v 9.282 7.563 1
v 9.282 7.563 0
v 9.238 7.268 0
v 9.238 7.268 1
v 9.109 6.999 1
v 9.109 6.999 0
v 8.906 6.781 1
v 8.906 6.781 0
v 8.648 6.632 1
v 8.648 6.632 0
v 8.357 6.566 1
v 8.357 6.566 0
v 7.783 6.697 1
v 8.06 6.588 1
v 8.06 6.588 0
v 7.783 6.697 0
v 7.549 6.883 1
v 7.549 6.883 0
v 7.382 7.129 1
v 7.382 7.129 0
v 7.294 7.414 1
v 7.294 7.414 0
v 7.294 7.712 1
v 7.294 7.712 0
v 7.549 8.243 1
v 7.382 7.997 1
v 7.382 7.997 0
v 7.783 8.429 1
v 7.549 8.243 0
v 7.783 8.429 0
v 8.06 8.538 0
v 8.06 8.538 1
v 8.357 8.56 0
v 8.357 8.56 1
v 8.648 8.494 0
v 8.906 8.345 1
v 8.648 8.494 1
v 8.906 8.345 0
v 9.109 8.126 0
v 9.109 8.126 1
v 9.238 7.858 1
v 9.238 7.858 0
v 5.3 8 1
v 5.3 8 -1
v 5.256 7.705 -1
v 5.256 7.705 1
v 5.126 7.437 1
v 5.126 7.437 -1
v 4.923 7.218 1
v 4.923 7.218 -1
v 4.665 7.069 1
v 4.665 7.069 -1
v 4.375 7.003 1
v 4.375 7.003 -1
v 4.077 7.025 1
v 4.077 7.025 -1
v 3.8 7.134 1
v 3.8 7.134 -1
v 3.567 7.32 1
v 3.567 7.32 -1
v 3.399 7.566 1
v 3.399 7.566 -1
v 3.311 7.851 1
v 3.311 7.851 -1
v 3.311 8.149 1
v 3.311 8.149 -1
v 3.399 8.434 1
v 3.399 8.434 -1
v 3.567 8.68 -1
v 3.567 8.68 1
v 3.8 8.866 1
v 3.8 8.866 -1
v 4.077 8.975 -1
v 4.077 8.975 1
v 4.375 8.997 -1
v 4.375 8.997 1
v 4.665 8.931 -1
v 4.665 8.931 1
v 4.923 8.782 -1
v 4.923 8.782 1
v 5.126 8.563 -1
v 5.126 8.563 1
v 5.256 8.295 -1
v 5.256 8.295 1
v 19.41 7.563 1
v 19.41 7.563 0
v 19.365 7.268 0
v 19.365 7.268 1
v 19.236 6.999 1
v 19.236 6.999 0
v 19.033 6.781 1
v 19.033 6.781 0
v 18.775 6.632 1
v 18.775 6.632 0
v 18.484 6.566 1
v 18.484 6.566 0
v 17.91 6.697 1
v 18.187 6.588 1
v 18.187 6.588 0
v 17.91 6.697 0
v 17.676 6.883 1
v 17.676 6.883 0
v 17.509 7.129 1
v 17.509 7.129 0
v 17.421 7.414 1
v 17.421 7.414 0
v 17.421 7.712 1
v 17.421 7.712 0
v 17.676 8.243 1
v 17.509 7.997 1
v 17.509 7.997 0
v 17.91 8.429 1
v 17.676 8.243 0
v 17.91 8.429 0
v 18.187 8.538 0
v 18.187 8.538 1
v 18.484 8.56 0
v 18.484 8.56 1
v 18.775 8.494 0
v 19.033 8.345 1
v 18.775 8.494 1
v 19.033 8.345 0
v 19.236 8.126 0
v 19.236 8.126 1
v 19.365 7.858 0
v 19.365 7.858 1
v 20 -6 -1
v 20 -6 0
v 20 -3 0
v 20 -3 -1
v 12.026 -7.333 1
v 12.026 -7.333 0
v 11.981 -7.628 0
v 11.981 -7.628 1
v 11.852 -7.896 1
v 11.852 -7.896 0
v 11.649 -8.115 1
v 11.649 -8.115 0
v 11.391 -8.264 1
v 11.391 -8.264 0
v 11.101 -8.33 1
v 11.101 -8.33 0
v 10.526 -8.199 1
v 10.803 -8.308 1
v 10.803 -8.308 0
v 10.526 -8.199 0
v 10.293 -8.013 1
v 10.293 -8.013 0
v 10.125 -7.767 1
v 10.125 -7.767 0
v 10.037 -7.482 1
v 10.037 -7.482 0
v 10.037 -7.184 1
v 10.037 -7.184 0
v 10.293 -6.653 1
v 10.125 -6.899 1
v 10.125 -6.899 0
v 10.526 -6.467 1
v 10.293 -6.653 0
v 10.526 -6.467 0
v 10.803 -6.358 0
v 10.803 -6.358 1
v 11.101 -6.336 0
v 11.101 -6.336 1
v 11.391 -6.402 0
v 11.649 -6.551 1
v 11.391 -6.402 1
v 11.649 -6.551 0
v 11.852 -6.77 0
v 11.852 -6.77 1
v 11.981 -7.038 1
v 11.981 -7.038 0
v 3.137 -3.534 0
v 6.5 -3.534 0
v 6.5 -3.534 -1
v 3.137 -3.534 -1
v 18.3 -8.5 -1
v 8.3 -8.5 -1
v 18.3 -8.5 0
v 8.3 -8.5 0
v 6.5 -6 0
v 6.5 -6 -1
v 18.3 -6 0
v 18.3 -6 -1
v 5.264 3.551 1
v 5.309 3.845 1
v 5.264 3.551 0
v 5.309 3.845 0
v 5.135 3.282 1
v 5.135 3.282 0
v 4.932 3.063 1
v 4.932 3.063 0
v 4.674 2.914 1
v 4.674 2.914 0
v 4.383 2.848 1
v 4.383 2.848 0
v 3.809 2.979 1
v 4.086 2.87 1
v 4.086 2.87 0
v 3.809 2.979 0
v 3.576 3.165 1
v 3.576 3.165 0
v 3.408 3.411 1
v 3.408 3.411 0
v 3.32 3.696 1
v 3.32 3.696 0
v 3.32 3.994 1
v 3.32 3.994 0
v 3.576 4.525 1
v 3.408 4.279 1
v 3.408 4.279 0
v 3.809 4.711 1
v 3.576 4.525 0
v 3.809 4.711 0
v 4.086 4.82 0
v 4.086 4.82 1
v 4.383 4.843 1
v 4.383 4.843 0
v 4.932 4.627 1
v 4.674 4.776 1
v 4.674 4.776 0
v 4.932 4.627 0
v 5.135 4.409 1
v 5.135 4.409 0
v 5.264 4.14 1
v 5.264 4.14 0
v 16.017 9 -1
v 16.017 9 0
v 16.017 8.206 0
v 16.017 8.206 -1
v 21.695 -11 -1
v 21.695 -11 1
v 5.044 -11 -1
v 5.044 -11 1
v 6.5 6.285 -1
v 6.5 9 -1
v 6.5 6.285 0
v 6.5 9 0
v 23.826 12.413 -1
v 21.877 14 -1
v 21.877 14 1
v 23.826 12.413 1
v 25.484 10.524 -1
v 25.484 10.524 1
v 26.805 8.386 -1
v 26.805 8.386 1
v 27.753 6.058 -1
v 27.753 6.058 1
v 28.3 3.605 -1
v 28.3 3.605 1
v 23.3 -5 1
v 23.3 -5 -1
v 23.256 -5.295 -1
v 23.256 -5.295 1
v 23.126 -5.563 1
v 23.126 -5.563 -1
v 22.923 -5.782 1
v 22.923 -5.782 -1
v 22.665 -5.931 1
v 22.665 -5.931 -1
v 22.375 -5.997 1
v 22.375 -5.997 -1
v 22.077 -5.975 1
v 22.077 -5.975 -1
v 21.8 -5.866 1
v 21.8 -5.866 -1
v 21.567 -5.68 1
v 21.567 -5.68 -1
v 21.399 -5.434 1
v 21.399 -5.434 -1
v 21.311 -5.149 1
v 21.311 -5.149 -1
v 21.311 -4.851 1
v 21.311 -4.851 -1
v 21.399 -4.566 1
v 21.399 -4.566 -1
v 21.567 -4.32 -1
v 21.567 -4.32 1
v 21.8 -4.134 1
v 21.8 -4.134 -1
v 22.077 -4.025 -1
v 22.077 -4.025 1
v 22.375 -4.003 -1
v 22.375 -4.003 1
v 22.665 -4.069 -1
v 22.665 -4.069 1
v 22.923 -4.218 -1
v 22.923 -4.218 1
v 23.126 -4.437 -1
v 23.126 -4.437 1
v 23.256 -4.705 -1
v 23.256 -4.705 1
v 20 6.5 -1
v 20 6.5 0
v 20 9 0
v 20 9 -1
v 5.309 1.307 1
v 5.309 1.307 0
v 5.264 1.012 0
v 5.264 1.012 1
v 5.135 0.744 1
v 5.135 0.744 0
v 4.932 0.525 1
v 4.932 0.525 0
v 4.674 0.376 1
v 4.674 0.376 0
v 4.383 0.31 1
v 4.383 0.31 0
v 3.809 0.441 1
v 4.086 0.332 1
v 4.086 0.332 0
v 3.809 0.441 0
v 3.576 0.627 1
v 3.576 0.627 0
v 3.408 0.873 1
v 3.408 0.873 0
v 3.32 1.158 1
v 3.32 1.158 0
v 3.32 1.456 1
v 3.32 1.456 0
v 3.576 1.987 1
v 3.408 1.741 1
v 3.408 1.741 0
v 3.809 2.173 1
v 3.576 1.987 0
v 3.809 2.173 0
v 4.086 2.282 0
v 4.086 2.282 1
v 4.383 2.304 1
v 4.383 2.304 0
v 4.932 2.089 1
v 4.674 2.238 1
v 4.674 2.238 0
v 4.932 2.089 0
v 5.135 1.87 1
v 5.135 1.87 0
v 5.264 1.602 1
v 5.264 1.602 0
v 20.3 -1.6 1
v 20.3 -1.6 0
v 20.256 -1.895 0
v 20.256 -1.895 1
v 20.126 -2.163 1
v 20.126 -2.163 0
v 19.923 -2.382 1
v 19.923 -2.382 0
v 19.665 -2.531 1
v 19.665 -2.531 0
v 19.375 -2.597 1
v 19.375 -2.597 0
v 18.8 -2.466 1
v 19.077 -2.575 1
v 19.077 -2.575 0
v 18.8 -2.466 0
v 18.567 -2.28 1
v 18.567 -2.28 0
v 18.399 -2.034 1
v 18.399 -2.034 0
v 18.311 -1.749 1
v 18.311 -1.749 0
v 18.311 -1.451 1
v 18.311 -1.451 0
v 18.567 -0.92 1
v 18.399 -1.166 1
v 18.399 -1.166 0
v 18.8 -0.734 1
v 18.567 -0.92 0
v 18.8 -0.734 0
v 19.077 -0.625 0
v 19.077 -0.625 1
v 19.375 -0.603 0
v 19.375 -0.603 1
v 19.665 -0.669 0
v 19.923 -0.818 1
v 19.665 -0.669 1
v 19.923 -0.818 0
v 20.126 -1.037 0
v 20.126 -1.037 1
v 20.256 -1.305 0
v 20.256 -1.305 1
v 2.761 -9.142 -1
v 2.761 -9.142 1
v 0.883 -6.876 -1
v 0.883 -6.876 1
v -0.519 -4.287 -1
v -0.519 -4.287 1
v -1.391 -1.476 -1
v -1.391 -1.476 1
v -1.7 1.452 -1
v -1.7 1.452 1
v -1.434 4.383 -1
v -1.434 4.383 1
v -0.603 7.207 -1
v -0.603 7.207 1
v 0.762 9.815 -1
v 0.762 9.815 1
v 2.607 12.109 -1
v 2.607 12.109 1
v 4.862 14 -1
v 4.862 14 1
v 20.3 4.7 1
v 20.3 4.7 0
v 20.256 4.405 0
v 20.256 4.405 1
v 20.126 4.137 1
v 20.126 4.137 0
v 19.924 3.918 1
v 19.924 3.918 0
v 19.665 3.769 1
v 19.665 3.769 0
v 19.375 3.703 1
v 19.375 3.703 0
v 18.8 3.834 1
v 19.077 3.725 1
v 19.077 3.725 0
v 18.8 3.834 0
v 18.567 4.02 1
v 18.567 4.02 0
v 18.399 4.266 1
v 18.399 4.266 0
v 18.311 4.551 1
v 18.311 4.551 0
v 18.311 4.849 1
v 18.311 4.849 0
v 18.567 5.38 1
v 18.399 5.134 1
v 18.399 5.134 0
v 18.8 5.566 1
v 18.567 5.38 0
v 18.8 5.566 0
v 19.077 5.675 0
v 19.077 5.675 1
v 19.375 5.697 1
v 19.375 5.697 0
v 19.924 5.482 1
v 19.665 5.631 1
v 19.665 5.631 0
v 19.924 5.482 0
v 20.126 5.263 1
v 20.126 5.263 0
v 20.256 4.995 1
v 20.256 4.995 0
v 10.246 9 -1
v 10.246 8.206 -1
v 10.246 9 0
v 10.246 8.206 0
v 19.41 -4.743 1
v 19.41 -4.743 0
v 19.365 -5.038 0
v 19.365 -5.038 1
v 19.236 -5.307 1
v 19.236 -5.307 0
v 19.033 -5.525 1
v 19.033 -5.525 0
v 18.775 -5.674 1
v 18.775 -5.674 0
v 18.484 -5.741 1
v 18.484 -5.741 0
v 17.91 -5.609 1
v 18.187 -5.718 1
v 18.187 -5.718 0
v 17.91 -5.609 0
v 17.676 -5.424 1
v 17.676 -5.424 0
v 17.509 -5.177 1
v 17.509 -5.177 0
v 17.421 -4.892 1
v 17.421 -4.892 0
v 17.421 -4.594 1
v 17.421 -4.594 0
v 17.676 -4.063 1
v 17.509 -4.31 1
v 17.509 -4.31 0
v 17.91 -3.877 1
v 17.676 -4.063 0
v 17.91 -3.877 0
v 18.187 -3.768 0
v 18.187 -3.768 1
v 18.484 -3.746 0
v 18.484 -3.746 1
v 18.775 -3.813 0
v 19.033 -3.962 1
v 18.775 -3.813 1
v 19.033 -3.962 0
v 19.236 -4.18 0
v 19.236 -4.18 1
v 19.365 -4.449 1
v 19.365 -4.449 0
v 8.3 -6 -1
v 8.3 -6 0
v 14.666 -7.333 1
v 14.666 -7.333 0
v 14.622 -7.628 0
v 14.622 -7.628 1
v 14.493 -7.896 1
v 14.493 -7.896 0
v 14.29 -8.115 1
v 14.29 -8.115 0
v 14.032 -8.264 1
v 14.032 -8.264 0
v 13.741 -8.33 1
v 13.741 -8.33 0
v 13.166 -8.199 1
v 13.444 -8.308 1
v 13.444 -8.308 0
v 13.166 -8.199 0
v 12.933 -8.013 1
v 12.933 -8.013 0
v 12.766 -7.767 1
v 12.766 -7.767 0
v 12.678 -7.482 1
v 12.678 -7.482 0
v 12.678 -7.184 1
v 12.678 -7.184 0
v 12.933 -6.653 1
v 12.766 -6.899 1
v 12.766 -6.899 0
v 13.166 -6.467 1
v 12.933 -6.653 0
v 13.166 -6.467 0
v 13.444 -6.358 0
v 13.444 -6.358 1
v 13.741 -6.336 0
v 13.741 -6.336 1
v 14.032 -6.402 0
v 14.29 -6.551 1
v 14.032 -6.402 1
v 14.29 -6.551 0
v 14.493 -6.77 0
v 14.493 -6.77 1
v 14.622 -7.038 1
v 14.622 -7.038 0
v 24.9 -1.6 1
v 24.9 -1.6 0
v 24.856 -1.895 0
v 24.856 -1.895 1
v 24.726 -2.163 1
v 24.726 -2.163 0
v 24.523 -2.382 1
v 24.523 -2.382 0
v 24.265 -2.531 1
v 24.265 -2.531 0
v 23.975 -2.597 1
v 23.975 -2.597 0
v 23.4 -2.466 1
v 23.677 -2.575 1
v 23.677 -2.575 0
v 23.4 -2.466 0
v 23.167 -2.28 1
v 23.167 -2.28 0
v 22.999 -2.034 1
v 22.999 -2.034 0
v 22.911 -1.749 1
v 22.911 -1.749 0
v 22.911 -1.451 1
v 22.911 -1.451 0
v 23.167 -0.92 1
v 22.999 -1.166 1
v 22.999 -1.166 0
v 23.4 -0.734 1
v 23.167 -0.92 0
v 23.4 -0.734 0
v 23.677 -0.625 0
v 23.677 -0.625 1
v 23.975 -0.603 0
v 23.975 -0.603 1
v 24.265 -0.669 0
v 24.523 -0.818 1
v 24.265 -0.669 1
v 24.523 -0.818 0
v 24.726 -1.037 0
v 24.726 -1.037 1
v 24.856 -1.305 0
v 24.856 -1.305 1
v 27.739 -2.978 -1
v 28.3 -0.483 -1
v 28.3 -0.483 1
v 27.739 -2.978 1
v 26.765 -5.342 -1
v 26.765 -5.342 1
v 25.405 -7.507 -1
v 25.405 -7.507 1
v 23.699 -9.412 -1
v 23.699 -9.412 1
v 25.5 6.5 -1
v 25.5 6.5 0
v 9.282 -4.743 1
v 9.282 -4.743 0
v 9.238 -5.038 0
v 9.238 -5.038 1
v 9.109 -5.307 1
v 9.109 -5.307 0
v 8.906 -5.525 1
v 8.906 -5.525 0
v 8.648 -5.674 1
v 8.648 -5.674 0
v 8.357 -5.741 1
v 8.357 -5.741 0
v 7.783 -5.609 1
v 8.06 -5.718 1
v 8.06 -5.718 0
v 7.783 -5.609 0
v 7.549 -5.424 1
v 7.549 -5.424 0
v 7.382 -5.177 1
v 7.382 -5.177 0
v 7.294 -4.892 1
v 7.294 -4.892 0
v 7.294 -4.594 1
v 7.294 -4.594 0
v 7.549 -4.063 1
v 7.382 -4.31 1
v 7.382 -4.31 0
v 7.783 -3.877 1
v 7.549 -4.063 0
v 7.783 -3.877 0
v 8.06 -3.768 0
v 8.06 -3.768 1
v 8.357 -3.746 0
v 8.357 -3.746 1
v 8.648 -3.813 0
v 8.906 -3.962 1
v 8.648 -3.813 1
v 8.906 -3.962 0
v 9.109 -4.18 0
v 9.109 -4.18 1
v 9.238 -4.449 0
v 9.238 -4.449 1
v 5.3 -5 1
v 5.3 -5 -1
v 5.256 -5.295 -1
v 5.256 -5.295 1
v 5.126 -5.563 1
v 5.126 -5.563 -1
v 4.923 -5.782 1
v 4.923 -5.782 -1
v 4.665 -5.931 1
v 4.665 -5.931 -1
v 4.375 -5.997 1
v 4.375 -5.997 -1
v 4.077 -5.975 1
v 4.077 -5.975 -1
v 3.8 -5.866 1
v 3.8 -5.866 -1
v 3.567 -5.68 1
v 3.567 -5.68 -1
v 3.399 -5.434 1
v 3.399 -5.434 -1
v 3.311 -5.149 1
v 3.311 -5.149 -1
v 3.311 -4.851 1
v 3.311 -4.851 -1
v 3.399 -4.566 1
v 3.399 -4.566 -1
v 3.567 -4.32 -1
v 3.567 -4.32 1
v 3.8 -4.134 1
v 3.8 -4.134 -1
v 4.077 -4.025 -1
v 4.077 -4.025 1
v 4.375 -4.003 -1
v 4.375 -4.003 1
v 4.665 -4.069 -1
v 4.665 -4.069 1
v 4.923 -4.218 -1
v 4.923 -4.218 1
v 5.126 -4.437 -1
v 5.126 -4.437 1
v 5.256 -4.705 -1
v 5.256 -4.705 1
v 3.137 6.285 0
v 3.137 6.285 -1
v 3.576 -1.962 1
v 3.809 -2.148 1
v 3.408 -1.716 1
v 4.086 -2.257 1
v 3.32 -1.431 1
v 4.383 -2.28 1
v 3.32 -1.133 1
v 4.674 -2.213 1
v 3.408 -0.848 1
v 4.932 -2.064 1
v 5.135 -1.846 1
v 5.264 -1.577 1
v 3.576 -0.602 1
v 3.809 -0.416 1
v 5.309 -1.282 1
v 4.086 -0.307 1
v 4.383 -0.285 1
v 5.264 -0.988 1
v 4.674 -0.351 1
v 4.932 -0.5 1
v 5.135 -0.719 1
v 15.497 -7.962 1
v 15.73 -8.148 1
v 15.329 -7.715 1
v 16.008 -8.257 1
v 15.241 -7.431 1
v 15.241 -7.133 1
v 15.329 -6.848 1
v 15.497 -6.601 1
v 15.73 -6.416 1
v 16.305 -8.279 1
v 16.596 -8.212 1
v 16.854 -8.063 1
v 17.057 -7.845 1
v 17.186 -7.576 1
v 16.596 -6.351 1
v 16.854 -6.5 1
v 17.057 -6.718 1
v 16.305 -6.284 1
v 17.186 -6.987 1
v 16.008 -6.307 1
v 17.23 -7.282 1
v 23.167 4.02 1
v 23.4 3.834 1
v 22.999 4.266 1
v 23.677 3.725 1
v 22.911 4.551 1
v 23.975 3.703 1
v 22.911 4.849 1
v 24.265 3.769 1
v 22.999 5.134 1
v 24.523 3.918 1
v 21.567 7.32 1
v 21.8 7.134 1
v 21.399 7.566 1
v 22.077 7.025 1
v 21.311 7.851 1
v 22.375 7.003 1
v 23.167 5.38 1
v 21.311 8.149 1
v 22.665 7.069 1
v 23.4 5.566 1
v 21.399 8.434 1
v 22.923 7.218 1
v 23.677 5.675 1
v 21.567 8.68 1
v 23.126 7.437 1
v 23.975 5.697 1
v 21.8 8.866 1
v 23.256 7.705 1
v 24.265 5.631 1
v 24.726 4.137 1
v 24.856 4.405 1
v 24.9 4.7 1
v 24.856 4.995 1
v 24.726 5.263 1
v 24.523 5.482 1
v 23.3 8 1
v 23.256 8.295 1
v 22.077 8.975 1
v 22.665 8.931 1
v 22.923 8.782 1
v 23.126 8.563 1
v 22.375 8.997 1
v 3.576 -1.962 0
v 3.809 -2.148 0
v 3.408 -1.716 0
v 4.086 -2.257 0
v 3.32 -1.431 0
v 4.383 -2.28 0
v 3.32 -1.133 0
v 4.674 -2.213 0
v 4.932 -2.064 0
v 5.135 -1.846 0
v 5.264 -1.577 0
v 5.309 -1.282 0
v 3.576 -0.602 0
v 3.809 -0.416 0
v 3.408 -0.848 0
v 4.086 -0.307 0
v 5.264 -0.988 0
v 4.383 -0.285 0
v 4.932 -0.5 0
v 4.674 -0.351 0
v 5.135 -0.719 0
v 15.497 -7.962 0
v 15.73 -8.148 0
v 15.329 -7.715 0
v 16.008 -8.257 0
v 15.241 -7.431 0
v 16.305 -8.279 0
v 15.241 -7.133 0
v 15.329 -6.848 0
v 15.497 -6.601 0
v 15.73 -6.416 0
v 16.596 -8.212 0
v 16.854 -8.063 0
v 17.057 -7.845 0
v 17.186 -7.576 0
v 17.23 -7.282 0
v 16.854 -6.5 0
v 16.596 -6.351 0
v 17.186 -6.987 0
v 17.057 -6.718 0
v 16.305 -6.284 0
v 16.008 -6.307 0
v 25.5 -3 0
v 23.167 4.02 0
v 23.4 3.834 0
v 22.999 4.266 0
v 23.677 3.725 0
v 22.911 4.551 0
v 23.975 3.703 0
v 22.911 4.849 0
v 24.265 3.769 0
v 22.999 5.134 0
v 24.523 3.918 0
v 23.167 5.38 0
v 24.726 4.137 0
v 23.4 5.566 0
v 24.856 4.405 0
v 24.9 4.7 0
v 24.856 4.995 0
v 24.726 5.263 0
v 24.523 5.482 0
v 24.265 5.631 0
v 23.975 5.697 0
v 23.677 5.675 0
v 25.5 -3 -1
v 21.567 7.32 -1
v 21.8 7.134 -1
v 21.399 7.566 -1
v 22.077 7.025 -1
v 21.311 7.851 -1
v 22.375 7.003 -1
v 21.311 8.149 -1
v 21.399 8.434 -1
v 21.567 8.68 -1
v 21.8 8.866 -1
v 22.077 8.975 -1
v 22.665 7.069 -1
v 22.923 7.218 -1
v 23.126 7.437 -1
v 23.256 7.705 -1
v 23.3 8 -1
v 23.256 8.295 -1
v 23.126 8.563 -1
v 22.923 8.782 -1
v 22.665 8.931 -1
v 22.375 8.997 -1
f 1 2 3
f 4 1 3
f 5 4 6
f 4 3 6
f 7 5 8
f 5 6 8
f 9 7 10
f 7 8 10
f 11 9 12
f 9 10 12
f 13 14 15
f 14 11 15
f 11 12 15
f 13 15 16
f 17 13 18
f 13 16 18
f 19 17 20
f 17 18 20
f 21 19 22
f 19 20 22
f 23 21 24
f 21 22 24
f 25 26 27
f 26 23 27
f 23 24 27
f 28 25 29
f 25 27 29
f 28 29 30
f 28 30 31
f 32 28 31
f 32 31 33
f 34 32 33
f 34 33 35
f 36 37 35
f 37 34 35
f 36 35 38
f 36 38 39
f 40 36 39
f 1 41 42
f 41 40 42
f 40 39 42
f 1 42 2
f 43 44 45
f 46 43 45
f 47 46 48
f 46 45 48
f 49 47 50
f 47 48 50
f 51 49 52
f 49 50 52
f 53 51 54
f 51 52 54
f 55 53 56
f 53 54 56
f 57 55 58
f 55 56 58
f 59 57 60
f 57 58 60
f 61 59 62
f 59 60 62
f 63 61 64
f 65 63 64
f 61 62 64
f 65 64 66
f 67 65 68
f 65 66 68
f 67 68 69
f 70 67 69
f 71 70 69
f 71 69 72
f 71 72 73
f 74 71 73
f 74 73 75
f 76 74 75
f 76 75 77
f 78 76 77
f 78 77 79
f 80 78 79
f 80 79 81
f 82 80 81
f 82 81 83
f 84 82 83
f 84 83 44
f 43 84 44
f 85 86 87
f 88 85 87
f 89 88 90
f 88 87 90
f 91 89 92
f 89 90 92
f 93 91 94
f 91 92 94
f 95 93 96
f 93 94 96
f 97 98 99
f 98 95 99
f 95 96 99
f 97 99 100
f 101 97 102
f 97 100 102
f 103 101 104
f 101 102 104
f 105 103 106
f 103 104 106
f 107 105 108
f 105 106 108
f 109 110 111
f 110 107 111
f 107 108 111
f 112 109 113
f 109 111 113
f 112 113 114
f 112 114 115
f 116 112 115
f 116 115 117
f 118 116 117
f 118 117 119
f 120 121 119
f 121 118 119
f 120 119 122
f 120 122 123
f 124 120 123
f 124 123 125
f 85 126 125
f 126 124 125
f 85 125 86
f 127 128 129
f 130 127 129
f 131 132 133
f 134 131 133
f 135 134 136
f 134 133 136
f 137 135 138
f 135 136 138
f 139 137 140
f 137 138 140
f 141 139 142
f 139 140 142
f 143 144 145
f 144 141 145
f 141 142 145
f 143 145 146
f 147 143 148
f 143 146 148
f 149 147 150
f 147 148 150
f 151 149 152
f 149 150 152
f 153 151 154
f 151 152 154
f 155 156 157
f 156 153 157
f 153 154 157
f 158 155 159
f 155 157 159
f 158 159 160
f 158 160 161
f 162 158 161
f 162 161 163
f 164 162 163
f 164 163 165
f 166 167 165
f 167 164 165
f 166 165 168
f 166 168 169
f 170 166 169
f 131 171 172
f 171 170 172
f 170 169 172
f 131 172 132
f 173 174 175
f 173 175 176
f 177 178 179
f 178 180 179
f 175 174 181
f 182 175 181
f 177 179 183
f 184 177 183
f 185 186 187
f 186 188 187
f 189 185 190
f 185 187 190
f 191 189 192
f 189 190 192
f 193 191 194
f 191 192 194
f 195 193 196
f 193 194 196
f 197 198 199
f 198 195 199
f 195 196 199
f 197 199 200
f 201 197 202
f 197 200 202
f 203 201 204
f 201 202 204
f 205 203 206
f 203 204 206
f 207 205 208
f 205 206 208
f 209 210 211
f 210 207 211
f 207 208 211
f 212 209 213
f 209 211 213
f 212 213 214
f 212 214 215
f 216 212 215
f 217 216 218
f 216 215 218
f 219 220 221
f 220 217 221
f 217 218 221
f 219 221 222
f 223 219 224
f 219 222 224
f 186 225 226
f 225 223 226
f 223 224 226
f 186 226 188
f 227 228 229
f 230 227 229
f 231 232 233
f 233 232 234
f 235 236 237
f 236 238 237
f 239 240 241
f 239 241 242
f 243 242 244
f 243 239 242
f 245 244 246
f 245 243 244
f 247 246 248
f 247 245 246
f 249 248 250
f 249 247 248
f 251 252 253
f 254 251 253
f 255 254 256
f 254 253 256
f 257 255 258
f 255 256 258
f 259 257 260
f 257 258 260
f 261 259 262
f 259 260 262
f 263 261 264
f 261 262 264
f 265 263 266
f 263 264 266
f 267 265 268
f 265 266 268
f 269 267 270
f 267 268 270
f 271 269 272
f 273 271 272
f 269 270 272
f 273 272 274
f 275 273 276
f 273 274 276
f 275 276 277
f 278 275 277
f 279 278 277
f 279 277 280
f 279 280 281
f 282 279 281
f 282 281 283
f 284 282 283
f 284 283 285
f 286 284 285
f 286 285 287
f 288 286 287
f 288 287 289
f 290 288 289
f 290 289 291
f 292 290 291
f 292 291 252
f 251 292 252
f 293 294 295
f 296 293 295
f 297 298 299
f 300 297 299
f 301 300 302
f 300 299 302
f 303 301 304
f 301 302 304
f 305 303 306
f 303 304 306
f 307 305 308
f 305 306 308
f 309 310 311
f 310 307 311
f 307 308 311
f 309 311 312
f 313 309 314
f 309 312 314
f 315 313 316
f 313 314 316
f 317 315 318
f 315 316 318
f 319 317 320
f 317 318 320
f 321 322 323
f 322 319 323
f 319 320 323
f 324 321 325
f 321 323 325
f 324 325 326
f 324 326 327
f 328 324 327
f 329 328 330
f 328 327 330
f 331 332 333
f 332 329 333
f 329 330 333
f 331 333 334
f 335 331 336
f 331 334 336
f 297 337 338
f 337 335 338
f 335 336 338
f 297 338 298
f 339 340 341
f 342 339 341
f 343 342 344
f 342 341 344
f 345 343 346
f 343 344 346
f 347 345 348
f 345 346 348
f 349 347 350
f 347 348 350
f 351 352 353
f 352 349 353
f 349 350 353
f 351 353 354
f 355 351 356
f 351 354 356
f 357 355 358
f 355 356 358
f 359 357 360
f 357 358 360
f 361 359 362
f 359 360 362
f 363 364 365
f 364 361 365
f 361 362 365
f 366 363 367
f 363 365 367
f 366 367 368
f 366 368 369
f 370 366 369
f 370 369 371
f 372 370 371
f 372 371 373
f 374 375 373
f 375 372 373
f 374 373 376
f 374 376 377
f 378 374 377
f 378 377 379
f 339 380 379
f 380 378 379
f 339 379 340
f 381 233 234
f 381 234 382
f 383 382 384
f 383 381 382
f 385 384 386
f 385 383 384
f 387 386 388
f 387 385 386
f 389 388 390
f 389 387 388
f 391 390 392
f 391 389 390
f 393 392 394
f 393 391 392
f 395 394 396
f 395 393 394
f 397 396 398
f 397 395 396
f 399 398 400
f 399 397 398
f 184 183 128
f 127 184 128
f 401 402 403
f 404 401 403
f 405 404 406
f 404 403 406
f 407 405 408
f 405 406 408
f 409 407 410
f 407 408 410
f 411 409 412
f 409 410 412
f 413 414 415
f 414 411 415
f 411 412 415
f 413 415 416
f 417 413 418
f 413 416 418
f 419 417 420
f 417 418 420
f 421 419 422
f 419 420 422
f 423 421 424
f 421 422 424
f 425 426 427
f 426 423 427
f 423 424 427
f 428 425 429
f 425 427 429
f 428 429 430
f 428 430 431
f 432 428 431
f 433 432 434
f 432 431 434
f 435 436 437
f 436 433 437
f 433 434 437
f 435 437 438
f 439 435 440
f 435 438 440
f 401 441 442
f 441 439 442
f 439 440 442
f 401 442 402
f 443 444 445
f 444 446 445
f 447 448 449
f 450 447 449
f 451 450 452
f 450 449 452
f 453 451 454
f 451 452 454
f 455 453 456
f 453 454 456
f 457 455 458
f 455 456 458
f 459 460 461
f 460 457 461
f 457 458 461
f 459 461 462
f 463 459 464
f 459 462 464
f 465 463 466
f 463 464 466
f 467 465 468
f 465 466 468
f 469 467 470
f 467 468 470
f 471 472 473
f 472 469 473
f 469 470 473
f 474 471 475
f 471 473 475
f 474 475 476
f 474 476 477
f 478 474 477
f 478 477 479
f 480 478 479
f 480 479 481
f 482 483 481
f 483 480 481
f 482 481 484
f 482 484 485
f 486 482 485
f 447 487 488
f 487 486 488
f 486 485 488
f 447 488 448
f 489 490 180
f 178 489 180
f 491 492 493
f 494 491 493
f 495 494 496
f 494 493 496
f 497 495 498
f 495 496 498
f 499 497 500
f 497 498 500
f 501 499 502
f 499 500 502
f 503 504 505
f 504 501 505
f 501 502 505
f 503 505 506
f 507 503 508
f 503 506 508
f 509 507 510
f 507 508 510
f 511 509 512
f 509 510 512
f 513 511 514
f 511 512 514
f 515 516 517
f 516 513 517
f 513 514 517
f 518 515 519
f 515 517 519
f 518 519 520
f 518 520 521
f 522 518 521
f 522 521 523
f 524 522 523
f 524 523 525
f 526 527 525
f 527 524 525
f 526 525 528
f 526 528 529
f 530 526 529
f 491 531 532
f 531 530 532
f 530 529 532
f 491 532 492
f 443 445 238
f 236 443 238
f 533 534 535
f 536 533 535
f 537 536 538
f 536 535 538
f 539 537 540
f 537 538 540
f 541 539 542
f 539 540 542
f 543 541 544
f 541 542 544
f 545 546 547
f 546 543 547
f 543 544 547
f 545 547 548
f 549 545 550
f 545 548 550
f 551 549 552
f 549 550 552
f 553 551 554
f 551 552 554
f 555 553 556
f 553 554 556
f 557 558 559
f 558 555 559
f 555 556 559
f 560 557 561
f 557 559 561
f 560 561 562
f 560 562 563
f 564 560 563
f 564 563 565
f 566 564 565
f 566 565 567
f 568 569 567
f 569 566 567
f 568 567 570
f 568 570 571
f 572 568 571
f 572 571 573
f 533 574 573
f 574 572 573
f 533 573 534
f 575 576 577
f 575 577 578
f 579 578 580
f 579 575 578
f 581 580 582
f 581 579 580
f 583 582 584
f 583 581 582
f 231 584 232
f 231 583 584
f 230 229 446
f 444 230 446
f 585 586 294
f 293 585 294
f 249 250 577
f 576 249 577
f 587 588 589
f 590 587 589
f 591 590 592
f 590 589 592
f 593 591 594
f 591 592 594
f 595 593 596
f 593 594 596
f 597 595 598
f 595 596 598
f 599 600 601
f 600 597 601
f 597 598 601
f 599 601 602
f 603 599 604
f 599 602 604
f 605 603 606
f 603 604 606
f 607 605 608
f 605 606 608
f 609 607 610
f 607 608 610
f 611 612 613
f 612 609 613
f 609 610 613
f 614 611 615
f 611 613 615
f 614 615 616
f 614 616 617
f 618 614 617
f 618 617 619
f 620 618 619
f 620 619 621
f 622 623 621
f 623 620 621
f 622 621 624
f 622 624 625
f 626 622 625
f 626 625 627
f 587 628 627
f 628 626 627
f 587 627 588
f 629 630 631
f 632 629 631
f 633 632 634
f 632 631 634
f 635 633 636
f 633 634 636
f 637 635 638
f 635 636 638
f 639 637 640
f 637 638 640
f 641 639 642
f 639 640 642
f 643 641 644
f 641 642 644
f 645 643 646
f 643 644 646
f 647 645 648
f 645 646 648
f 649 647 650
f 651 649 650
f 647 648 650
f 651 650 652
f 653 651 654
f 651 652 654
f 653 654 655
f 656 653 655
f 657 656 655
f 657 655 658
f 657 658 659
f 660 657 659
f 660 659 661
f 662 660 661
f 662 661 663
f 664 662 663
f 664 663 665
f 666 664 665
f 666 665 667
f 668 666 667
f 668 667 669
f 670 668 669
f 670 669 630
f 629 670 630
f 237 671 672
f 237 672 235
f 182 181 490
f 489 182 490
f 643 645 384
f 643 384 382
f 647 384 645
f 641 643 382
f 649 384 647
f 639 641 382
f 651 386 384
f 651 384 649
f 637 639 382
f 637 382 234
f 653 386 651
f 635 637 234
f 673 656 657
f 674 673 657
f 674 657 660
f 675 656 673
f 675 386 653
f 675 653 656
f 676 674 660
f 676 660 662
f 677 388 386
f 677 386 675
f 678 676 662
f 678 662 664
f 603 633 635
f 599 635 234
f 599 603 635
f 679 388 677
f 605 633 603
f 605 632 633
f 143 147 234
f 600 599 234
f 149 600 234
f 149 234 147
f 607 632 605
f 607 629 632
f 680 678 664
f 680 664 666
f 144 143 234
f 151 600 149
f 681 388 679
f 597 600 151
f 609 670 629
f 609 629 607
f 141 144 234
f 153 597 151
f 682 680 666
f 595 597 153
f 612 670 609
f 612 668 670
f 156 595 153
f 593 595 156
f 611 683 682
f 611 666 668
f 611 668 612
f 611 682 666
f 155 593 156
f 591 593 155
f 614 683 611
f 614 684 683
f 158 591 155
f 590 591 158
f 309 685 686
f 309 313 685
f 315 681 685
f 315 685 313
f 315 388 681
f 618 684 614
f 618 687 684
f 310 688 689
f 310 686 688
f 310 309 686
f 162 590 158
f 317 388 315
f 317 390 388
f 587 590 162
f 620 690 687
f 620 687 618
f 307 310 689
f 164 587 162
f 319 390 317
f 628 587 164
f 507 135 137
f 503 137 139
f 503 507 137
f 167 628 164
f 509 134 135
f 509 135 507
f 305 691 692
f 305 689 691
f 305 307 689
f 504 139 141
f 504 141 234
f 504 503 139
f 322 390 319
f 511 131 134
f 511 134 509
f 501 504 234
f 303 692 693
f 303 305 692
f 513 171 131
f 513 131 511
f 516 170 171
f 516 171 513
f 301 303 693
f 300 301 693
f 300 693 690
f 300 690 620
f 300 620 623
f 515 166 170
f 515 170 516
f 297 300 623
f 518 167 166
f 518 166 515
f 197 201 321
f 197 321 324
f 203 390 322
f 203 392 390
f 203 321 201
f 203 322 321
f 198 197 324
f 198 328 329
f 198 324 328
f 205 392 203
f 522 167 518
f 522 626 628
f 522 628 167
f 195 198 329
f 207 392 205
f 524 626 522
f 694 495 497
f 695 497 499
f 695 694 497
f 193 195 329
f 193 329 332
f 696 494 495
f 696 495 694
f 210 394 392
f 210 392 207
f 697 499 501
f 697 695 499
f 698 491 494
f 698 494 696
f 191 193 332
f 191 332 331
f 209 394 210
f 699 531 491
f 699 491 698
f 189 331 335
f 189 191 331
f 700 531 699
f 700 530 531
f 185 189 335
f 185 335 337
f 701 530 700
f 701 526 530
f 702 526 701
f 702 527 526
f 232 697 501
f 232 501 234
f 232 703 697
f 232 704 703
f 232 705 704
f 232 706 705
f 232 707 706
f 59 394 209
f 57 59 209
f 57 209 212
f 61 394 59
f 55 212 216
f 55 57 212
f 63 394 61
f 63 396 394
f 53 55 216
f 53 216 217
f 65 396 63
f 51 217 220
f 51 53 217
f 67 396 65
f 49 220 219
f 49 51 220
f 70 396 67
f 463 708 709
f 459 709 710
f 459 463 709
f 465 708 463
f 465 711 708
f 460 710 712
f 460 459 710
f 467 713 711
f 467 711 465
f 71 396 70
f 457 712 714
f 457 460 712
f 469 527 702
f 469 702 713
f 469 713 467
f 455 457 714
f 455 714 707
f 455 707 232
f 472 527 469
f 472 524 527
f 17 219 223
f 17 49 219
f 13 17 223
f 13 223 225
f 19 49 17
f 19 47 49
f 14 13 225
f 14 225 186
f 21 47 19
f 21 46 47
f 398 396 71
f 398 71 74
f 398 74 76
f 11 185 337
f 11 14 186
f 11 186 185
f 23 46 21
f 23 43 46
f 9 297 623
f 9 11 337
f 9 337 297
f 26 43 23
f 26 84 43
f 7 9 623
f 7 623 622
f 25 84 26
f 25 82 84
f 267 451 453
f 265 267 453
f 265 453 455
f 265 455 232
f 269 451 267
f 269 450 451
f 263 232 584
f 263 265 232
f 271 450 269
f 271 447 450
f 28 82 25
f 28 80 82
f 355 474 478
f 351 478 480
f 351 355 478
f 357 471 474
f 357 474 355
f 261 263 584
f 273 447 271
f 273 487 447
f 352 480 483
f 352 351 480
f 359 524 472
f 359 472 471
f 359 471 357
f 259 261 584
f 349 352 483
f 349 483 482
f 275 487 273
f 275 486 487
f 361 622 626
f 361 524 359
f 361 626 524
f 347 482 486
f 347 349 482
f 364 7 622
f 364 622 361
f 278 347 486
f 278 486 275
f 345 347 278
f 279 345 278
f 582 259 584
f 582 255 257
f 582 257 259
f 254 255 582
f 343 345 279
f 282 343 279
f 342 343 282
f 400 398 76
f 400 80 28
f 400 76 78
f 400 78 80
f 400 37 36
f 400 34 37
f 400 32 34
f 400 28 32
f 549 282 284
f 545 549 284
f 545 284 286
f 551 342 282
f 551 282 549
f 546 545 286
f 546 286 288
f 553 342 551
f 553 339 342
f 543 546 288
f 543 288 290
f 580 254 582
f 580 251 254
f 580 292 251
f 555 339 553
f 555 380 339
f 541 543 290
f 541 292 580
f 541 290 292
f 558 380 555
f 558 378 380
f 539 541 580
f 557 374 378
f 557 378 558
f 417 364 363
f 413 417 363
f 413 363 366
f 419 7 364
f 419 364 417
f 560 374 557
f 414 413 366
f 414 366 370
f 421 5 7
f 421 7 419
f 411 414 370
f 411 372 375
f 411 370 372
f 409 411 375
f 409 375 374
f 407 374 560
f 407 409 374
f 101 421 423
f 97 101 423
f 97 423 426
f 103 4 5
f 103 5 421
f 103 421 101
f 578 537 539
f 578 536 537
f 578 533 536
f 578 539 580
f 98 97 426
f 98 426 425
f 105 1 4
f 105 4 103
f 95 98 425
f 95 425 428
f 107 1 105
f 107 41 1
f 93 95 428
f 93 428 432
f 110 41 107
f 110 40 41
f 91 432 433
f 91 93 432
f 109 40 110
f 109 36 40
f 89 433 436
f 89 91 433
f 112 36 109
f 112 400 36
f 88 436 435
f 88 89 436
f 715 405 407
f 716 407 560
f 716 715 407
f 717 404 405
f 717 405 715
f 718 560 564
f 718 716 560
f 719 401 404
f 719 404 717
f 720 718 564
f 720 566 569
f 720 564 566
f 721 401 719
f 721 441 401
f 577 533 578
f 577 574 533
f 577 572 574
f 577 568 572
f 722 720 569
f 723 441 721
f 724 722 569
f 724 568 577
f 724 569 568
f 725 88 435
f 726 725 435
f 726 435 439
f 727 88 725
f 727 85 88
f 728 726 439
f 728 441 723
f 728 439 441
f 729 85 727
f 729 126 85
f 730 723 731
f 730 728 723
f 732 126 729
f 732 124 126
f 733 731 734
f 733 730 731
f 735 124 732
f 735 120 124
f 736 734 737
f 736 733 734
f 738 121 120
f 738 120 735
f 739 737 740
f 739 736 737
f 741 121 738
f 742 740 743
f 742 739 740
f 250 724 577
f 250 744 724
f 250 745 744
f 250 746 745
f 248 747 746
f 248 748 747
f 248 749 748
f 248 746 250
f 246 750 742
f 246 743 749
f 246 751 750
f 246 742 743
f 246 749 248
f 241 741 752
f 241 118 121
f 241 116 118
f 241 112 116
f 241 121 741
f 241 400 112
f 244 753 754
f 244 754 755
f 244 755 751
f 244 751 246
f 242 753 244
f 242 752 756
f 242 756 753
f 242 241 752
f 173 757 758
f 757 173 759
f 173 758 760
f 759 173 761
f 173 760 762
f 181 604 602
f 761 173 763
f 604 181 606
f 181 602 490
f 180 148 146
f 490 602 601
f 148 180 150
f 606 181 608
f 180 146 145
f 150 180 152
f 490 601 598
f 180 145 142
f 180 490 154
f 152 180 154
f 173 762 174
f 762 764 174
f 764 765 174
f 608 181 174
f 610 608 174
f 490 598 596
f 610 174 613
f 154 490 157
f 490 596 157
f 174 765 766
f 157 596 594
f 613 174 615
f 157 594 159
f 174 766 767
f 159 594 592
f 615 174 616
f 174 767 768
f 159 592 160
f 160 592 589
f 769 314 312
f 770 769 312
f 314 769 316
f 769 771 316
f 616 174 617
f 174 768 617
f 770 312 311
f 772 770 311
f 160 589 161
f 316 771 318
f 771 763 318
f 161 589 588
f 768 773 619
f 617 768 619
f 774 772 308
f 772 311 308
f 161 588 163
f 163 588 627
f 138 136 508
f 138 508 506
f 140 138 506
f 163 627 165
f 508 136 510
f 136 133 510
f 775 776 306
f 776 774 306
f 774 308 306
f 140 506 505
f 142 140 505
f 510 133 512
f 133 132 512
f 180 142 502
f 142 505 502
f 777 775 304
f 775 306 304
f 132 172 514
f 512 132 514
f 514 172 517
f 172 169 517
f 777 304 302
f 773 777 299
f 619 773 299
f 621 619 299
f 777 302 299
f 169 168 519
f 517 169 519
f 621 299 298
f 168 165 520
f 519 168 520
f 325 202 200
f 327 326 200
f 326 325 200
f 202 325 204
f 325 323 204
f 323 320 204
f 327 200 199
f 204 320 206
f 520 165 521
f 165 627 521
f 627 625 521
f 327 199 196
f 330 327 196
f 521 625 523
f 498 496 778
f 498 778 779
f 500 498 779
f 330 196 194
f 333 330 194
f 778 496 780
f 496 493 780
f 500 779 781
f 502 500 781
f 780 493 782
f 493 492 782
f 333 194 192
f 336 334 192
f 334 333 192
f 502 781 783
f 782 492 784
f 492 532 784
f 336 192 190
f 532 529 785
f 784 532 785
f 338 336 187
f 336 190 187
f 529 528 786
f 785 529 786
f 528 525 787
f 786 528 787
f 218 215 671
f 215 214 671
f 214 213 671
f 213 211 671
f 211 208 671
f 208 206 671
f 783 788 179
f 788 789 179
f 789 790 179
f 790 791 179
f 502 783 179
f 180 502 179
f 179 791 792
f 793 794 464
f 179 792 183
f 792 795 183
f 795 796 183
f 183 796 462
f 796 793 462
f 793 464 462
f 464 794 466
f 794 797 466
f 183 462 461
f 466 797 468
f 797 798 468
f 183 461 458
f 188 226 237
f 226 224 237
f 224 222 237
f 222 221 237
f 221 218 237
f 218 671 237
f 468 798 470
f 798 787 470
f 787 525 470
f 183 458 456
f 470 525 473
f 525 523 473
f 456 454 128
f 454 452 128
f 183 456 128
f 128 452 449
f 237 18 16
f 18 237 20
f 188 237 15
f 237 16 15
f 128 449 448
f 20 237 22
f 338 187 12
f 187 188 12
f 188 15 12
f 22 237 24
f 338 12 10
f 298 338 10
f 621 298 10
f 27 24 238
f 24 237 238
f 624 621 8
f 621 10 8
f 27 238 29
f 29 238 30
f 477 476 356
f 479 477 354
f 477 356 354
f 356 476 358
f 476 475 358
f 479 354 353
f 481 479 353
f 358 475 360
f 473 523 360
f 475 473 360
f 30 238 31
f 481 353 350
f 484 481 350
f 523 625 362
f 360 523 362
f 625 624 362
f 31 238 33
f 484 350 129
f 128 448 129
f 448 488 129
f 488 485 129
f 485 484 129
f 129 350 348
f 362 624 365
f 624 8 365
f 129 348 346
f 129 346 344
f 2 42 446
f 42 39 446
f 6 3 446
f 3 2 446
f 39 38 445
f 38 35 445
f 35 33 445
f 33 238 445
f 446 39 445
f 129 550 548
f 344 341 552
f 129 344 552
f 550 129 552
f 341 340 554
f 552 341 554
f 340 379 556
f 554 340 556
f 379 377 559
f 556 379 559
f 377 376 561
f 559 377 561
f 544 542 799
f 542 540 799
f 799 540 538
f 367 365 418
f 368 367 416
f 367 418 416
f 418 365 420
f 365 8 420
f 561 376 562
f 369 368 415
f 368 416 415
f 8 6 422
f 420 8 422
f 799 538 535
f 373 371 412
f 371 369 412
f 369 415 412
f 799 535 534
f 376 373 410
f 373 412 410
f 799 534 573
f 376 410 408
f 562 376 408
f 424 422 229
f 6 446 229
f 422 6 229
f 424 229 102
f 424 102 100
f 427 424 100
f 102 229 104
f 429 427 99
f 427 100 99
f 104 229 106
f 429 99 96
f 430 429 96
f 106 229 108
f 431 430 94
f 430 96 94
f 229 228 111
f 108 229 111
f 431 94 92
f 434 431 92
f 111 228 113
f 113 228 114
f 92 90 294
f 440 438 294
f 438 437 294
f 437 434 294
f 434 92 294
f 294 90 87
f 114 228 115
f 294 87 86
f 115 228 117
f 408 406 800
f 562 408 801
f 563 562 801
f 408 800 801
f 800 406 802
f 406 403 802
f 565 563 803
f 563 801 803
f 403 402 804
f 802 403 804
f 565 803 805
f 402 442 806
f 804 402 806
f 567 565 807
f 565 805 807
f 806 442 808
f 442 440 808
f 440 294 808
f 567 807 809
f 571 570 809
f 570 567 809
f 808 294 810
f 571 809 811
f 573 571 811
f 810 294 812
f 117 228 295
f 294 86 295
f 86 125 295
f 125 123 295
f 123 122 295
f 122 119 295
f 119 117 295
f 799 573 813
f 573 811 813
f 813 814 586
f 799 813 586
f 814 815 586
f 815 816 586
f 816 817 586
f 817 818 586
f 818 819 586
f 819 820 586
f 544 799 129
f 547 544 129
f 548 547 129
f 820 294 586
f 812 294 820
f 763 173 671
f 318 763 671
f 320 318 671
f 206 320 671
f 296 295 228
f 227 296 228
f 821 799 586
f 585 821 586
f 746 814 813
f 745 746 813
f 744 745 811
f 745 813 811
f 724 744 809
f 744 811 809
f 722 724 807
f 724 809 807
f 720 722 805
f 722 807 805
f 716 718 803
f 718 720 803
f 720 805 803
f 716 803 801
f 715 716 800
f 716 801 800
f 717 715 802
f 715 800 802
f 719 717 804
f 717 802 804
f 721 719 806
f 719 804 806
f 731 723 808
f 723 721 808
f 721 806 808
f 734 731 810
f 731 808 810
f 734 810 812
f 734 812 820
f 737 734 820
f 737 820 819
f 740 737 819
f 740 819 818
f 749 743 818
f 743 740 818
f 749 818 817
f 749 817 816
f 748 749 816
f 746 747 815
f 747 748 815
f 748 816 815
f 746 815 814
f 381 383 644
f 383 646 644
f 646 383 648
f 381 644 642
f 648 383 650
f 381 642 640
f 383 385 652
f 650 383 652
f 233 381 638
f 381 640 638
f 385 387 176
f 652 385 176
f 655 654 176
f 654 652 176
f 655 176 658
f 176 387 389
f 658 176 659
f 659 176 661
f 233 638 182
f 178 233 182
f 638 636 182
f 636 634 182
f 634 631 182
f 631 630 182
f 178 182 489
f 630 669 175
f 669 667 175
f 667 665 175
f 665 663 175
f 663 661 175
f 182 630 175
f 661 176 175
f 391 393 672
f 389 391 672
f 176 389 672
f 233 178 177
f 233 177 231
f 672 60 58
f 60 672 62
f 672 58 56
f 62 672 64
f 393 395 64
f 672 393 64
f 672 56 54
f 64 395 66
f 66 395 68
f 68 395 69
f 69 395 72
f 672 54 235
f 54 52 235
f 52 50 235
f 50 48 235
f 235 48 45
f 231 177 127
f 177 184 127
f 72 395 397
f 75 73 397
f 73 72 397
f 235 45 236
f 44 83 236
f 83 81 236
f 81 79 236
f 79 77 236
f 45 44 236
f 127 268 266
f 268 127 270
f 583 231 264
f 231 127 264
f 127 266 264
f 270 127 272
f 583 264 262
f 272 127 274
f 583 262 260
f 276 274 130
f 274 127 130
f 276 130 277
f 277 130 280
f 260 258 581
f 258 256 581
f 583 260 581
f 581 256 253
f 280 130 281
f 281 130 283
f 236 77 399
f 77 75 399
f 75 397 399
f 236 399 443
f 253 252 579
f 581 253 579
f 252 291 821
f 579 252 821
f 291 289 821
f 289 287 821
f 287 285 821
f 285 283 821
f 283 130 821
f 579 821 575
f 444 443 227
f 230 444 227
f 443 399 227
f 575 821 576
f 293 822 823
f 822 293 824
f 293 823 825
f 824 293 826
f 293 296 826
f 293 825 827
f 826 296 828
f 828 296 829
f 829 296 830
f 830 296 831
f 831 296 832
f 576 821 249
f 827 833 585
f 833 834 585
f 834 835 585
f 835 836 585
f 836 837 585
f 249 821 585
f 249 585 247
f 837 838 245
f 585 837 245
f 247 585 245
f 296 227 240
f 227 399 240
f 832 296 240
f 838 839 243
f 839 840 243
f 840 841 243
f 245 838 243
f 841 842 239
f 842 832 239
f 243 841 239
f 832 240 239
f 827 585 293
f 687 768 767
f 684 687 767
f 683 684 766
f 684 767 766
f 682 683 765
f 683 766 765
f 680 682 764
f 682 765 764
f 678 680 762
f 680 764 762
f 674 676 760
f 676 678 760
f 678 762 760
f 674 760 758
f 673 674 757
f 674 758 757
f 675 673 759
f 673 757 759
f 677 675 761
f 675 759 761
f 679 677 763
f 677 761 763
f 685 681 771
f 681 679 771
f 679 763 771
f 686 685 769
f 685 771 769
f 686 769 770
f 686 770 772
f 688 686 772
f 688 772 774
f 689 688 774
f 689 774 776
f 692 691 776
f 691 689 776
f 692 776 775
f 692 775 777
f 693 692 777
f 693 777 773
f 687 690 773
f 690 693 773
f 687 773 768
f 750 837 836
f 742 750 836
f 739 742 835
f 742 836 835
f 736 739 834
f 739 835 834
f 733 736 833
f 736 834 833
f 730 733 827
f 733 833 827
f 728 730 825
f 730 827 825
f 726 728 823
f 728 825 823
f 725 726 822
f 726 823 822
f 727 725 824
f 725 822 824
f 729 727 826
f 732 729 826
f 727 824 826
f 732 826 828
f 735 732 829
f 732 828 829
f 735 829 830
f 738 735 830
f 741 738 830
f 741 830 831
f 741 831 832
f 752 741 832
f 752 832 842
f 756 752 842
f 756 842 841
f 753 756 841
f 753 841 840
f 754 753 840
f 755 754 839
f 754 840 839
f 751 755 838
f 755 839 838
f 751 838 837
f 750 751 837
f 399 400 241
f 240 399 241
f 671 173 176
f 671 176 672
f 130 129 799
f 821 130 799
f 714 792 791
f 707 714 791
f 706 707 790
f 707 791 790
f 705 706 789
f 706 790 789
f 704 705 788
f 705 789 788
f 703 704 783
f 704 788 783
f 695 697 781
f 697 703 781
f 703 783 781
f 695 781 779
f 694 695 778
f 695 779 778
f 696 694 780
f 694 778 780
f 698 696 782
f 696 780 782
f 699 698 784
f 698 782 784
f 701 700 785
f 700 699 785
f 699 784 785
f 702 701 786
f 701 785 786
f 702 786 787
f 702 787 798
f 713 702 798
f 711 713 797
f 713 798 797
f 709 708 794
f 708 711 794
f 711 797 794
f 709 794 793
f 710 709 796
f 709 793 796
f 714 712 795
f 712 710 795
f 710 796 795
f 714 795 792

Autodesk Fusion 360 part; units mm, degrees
sketch "Sketch2" plane through (0, 0, 0) normal (0, 0, 1) x (1, 0, 0)
  circle A0 centre (19.3, 4.7) radius 1.0002
  circle A1 centre (23.9, 4.7) radius 1
  circle A2 centre (23.9, -1.6) radius 1
  circle A3 centre (19.3, -1.6) radius 1
  circle A4 centre (11.0258, -7.3329) radius 1
  circle A5 centre (13.6665, -7.3329) radius 1
  circle A6 centre (16.2303, -7.2816) radius 1
  circle A7 centre (4.3086, -1.2823) radius 1
  circle A8 centre (4.3086, 1.3071) radius 1
  circle A9 centre (4.3086, 3.8453) radius 1
  circle A10 centre (8.2825, -4.7434) radius 1
  circle A11 centre (8.2825, 7.5628) radius 1
  circle A12 centre (18.4095, 7.5628) radius 1
  circle A13 centre (18.4095, -4.7434) radius 1
  line L0 (2, 10) -> (26, 10)
  line L1 (26, 10) -> (26, -10)
  line L2 (26, -10) -> (2, -10)
  line L3 (2, -10) -> (2, 10)
  dimension "d1" = 2
  dimension "d2" = 2
  dimension "d3" = 2
  dimension "d4" = 2
  dimension "d5" = 2
  dimension "d6" = 2
  dimension "d7" = 2
  dimension "d8" = 2
  dimension "d9" = 2
  dimension "d10" = 2
  dimension "d11" = 2
  dimension "d12" = 2
extrude "Extrude1" add sketch "Sketch2" along normal blind 1
sketch "Sketch3" plane through (0, 0, 0) normal (0, 0, 1) x (1, 0, 0)
  line L0 (8.3, -8.5) -> (18.3, -8.5)
  line L1 (18.3, -8.5) -> (18.3, -4.6)
  line L2 (18.3, -4.6) -> (8.3, -4.6)
  line L3 (8.3, -4.6) -> (8.3, -8.5)
  line L4 (3.1366, 6.2847) -> (6.7858, 6.2847)
  line L5 (6.7858, 6.2847) -> (6.7858, -3.5343)
  line L6 (6.7858, -3.5343) -> (3.1366, -3.5343)
  line L7 (3.1366, -3.5343) -> (3.1366, 6.2847)
  line L8 (6.5, -5) -> (20, -5)
  line L9 (20, -5) -> (20, 9)
  line L10 (20, 9) -> (6.5, 9)
  line L11 (6.5, 9) -> (6.5, -5)
  line L12 (20, -3) -> (25.5, -3)
  line L13 (25.5, -3) -> (25.5, 6.5)
  line L14 (25.5, 6.5) -> (20, 6.5)
  line L15 (20, 6.5) -> (20, -3)
  line L16 (10.2456, 9) -> (16.0175, 9)
  line L17 (16.0175, 9) -> (16.0175, 8.206)
  line L18 (16.0175, 8.206) -> (10.2456, 8.206)
  line L19 (10.2456, 8.206) -> (10.2456, 9)
  line L20 (2, -10) -> (26, -10)
  line L21 (26, -10) -> (26, 10)
  line L22 (26, 10) -> (2, 10)
  line L23 (2, 10) -> (2, -10)
  line L24 (20, -5) -> (6.5, -5)
  line L25 (6.5, -5) -> (6.5, -6)
  line L26 (6.5, -6) -> (20, -6)
  line L27 (20, -6) -> (20, -5)
extrude "Extrude2" add sketch "Sketch3" against normal blind 1 contours L10 L16 L17 L18 L19 | L20 L21 L22 L23
sketch "Sketch4" plane through (0, 0, 0) normal (0, 0, 1) x (1, 0, 0)
  circle A0 centre (13.3, 1.5) radius 0.7133
  line L0 (13.3, 1.5) -> (28.3, 1.5)
  line L1 (28.3, 1.5) -> (28.3, 14)
  line L2 (28.3, 14) -> (13.3, 14)
  line L3 (13.3, 14) -> (13.3, 1.5)
  line L4 (13.3, 1.5) -> (28.3, 1.5)
  line L5 (28.3, 1.5) -> (28.3, -11)
  line L6 (28.3, -11) -> (13.3, -11)
  line L7 (13.3, -11) -> (13.3, 1.5)
  line L8 (13.3, 1.5) -> (-1.7, 1.5)
  line L9 (-1.7, 1.5) -> (-1.7, 14)
  line L10 (-1.7, 14) -> (13.3, 14)
  line L11 (13.3, 14) -> (13.3, 1.5)
  line L12 (13.3, 1.5) -> (-1.7, 1.5)
  line L13 (-1.7, 1.5) -> (-1.7, -11)
  line L14 (-1.7, -11) -> (13.3, -11)
  line L15 (13.3, -11) -> (13.3, 1.5)
  line L16 (26, 10) -> (2, 10)
  line L17 (2, 10) -> (2, -10)
  line L18 (2, -10) -> (26, -10)
  line L19 (26, -10) -> (26, 10)
  dimension "d19" = 15
  dimension "d20" = 12.5
  dimension "d21" = 15
  dimension "d22" = 12.5
  dimension "d23" = 15
  dimension "d24" = 12.5
  dimension "d25" = 15
  dimension "d26" = 12.5
extrude "Extrude3" add sketch "Sketch4" along normal blind 1 contours L0 L1 L2 L3 L4 L11 L16 L19 | L0 L4 L5 L6 L7 L15 L18 L19 | L3 L8 L9 L10 L11 L12 L16 L17 | L7 L8 L12 L13 L14 L15 L17 L18
extrude "Extrude4" add 1 faces at (9.5333, 12.6667, 0) along direction (0, 0, -1) blind 1
sketch "Sketch5" plane through (0, 0, -1) normal (0, 0, -1) x (1, 0, 0)
  line L0 (-1.7, 11) -> (-1.7, -14)
  line L1 (-1.7, -14) -> (28.3, -14)
  line L2 (28.3, -14) -> (28.3, 11)
  line L3 (28.3, 11) -> (-1.7, 11)
  line L4 (6.5, 3.5343) -> (6.5, 6)
  line L5 (6.5, 6) -> (8.3, 6)
  line L6 (8.3, 6) -> (8.3, 8.5)
  line L7 (8.3, 8.5) -> (18.3, 8.5)
  line L8 (18.3, 8.5) -> (18.3, 6)
  line L9 (18.3, 6) -> (20, 6)
  line L10 (20, 6) -> (20, 3)
  line L11 (20, 3) -> (25.5, 3)
  line L12 (25.5, 3) -> (25.5, -6.5)
  line L13 (25.5, -6.5) -> (20, -6.5)
  line L14 (20, -6.5) -> (20, -9)
  line L15 (20, -9) -> (16.0175, -9)
  line L16 (16.0175, -9) -> (16.0175, -8.206)
  line L17 (16.0175, -8.206) -> (10.2456, -8.206)
  line L18 (10.2456, -8.206) -> (10.2456, -9)
  line L19 (10.2456, -9) -> (6.5, -9)
  line L20 (6.5, -9) -> (6.5, -6.2847)
  line L21 (6.5, -6.2847) -> (3.1366, -6.2847)
  line L22 (3.1366, -6.2847) -> (3.1366, 3.5343)
  line L23 (3.1366, 3.5343) -> (6.5, 3.5343)
  line L24 (28.3, -14) -> (22.3, -14)
  line L25 (22.3, -14) -> (22.3, -8)
  line L26 (22.3, -8) -> (28.3, -8)
  line L27 (28.3, -8) -> (28.3, -14)
  circle A0 centre (22.3, -8) radius 1
  line L28 (28.3, 11) -> (22.3, 11)
  line L29 (22.3, 11) -> (22.3, 5)
  line L30 (22.3, 5) -> (28.3, 5)
  line L31 (28.3, 5) -> (28.3, 11)
  circle A1 centre (22.3, 5) radius 1
  line L32 (-1.7, -14) -> (4.3, -14)
  line L33 (4.3, -14) -> (4.3, -8)
  line L34 (4.3, -8) -> (-1.7, -8)
  line L35 (-1.7, -8) -> (-1.7, -14)
  circle A2 centre (4.3, -8) radius 1
  line L36 (-1.7, 11) -> (4.3, 11)
  line L37 (4.3, 11) -> (4.3, 5)
  line L38 (4.3, 5) -> (-1.7, 5)
  line L39 (-1.7, 5) -> (-1.7, 11)
  circle A3 centre (4.3, 5) radius 1
  dimension "d31" = 2
  dimension "d32" = 2
  dimension "d33" = 6
  dimension "d34" = 6
  dimension "d35" = 2
  dimension "d36" = 6
  dimension "d37" = 2
  dimension "d40" = 6
  dimension "d43" = 6
  dimension "d44" = 6
  dimension "d45" = 6
  dimension "d46" = 6
extrude "Extrude5" cut sketch "Sketch5" against normal blind 2 contours L37 L38 A3 | L37 L38 A3 | L33 L34 A2 | L33 L34 A2 | L29 L30 A1 | L29 L30 A1 | L25 L26 A0 | L25 L26 A0
sketch "Sketch6" plane through (0, 0, -1) normal (0, 0, -1) x (1, 0, 0)
  circle A0 centre (4.3, 5) radius 1
  circle A1 centre (22.3, -8) radius 1
  circle A2 centre (4.3, -8) radius 1
  circle A3 centre (22.3, 5) radius 1
  line L0 (-1.7, 11) -> (-1.7, -14)
  line L1 (-1.7, -14) -> (28.3, -14)
  line L2 (28.3, -14) -> (28.3, 11)
  line L3 (28.3, 11) -> (-1.7, 11)
  line L4 (6.5, 3.5343) -> (6.5, 6)
  line L5 (6.5, 6) -> (8.3, 6)
  line L6 (8.3, 6) -> (8.3, 8.5)
  line L7 (8.3, 8.5) -> (18.3, 8.5)
  line L8 (18.3, 8.5) -> (18.3, 6)
  line L9 (18.3, 6) -> (20, 6)
  line L10 (20, 6) -> (20, 3)
  line L11 (20, 3) -> (25.5, 3)
  line L12 (25.5, 3) -> (25.5, -6.5)
  line L13 (25.5, -6.5) -> (20, -6.5)
  line L14 (20, -6.5) -> (20, -9)
  line L15 (20, -9) -> (16.0175, -9)
  line L16 (16.0175, -9) -> (16.0175, -8.206)
  line L17 (16.0175, -8.206) -> (10.2456, -8.206)
  line L18 (10.2456, -8.206) -> (10.2456, -9)
  line L19 (10.2456, -9) -> (6.5, -9)
  line L20 (6.5, -9) -> (6.5, -6.2847)
  line L21 (6.5, -6.2847) -> (3.1366, -6.2847)
  line L22 (3.1366, -6.2847) -> (3.1366, 3.5343)
  line L23 (3.1366, 3.5343) -> (6.5, 3.5343)
  circle A4 centre (13.3696, -1.5612) radius 15.0697
extrude "Extrude6" cut sketch "Sketch6" against normal blind 2 contours L0 L3 A4 | L0 L1 A4 | L2 L3 A4 | L1 L2 A4
equation "d33 = distanceFromRightLeft"
equation "d34 = distanceFromRightLeft"
equation "d36 = distanceFromRightLeft"
equation "d40 = distanceFromTopDown"
equation "distanceFromRightLeft = 6 mm"
equation "distanceFromTopDown = 6 mm"
equation "d43 = distanceFromTopDown"
equation "d44 = distanceFromRightLeft"
equation "d45 = distanceFromTopDown"
equation "d46 = distanceFromTopDown"
